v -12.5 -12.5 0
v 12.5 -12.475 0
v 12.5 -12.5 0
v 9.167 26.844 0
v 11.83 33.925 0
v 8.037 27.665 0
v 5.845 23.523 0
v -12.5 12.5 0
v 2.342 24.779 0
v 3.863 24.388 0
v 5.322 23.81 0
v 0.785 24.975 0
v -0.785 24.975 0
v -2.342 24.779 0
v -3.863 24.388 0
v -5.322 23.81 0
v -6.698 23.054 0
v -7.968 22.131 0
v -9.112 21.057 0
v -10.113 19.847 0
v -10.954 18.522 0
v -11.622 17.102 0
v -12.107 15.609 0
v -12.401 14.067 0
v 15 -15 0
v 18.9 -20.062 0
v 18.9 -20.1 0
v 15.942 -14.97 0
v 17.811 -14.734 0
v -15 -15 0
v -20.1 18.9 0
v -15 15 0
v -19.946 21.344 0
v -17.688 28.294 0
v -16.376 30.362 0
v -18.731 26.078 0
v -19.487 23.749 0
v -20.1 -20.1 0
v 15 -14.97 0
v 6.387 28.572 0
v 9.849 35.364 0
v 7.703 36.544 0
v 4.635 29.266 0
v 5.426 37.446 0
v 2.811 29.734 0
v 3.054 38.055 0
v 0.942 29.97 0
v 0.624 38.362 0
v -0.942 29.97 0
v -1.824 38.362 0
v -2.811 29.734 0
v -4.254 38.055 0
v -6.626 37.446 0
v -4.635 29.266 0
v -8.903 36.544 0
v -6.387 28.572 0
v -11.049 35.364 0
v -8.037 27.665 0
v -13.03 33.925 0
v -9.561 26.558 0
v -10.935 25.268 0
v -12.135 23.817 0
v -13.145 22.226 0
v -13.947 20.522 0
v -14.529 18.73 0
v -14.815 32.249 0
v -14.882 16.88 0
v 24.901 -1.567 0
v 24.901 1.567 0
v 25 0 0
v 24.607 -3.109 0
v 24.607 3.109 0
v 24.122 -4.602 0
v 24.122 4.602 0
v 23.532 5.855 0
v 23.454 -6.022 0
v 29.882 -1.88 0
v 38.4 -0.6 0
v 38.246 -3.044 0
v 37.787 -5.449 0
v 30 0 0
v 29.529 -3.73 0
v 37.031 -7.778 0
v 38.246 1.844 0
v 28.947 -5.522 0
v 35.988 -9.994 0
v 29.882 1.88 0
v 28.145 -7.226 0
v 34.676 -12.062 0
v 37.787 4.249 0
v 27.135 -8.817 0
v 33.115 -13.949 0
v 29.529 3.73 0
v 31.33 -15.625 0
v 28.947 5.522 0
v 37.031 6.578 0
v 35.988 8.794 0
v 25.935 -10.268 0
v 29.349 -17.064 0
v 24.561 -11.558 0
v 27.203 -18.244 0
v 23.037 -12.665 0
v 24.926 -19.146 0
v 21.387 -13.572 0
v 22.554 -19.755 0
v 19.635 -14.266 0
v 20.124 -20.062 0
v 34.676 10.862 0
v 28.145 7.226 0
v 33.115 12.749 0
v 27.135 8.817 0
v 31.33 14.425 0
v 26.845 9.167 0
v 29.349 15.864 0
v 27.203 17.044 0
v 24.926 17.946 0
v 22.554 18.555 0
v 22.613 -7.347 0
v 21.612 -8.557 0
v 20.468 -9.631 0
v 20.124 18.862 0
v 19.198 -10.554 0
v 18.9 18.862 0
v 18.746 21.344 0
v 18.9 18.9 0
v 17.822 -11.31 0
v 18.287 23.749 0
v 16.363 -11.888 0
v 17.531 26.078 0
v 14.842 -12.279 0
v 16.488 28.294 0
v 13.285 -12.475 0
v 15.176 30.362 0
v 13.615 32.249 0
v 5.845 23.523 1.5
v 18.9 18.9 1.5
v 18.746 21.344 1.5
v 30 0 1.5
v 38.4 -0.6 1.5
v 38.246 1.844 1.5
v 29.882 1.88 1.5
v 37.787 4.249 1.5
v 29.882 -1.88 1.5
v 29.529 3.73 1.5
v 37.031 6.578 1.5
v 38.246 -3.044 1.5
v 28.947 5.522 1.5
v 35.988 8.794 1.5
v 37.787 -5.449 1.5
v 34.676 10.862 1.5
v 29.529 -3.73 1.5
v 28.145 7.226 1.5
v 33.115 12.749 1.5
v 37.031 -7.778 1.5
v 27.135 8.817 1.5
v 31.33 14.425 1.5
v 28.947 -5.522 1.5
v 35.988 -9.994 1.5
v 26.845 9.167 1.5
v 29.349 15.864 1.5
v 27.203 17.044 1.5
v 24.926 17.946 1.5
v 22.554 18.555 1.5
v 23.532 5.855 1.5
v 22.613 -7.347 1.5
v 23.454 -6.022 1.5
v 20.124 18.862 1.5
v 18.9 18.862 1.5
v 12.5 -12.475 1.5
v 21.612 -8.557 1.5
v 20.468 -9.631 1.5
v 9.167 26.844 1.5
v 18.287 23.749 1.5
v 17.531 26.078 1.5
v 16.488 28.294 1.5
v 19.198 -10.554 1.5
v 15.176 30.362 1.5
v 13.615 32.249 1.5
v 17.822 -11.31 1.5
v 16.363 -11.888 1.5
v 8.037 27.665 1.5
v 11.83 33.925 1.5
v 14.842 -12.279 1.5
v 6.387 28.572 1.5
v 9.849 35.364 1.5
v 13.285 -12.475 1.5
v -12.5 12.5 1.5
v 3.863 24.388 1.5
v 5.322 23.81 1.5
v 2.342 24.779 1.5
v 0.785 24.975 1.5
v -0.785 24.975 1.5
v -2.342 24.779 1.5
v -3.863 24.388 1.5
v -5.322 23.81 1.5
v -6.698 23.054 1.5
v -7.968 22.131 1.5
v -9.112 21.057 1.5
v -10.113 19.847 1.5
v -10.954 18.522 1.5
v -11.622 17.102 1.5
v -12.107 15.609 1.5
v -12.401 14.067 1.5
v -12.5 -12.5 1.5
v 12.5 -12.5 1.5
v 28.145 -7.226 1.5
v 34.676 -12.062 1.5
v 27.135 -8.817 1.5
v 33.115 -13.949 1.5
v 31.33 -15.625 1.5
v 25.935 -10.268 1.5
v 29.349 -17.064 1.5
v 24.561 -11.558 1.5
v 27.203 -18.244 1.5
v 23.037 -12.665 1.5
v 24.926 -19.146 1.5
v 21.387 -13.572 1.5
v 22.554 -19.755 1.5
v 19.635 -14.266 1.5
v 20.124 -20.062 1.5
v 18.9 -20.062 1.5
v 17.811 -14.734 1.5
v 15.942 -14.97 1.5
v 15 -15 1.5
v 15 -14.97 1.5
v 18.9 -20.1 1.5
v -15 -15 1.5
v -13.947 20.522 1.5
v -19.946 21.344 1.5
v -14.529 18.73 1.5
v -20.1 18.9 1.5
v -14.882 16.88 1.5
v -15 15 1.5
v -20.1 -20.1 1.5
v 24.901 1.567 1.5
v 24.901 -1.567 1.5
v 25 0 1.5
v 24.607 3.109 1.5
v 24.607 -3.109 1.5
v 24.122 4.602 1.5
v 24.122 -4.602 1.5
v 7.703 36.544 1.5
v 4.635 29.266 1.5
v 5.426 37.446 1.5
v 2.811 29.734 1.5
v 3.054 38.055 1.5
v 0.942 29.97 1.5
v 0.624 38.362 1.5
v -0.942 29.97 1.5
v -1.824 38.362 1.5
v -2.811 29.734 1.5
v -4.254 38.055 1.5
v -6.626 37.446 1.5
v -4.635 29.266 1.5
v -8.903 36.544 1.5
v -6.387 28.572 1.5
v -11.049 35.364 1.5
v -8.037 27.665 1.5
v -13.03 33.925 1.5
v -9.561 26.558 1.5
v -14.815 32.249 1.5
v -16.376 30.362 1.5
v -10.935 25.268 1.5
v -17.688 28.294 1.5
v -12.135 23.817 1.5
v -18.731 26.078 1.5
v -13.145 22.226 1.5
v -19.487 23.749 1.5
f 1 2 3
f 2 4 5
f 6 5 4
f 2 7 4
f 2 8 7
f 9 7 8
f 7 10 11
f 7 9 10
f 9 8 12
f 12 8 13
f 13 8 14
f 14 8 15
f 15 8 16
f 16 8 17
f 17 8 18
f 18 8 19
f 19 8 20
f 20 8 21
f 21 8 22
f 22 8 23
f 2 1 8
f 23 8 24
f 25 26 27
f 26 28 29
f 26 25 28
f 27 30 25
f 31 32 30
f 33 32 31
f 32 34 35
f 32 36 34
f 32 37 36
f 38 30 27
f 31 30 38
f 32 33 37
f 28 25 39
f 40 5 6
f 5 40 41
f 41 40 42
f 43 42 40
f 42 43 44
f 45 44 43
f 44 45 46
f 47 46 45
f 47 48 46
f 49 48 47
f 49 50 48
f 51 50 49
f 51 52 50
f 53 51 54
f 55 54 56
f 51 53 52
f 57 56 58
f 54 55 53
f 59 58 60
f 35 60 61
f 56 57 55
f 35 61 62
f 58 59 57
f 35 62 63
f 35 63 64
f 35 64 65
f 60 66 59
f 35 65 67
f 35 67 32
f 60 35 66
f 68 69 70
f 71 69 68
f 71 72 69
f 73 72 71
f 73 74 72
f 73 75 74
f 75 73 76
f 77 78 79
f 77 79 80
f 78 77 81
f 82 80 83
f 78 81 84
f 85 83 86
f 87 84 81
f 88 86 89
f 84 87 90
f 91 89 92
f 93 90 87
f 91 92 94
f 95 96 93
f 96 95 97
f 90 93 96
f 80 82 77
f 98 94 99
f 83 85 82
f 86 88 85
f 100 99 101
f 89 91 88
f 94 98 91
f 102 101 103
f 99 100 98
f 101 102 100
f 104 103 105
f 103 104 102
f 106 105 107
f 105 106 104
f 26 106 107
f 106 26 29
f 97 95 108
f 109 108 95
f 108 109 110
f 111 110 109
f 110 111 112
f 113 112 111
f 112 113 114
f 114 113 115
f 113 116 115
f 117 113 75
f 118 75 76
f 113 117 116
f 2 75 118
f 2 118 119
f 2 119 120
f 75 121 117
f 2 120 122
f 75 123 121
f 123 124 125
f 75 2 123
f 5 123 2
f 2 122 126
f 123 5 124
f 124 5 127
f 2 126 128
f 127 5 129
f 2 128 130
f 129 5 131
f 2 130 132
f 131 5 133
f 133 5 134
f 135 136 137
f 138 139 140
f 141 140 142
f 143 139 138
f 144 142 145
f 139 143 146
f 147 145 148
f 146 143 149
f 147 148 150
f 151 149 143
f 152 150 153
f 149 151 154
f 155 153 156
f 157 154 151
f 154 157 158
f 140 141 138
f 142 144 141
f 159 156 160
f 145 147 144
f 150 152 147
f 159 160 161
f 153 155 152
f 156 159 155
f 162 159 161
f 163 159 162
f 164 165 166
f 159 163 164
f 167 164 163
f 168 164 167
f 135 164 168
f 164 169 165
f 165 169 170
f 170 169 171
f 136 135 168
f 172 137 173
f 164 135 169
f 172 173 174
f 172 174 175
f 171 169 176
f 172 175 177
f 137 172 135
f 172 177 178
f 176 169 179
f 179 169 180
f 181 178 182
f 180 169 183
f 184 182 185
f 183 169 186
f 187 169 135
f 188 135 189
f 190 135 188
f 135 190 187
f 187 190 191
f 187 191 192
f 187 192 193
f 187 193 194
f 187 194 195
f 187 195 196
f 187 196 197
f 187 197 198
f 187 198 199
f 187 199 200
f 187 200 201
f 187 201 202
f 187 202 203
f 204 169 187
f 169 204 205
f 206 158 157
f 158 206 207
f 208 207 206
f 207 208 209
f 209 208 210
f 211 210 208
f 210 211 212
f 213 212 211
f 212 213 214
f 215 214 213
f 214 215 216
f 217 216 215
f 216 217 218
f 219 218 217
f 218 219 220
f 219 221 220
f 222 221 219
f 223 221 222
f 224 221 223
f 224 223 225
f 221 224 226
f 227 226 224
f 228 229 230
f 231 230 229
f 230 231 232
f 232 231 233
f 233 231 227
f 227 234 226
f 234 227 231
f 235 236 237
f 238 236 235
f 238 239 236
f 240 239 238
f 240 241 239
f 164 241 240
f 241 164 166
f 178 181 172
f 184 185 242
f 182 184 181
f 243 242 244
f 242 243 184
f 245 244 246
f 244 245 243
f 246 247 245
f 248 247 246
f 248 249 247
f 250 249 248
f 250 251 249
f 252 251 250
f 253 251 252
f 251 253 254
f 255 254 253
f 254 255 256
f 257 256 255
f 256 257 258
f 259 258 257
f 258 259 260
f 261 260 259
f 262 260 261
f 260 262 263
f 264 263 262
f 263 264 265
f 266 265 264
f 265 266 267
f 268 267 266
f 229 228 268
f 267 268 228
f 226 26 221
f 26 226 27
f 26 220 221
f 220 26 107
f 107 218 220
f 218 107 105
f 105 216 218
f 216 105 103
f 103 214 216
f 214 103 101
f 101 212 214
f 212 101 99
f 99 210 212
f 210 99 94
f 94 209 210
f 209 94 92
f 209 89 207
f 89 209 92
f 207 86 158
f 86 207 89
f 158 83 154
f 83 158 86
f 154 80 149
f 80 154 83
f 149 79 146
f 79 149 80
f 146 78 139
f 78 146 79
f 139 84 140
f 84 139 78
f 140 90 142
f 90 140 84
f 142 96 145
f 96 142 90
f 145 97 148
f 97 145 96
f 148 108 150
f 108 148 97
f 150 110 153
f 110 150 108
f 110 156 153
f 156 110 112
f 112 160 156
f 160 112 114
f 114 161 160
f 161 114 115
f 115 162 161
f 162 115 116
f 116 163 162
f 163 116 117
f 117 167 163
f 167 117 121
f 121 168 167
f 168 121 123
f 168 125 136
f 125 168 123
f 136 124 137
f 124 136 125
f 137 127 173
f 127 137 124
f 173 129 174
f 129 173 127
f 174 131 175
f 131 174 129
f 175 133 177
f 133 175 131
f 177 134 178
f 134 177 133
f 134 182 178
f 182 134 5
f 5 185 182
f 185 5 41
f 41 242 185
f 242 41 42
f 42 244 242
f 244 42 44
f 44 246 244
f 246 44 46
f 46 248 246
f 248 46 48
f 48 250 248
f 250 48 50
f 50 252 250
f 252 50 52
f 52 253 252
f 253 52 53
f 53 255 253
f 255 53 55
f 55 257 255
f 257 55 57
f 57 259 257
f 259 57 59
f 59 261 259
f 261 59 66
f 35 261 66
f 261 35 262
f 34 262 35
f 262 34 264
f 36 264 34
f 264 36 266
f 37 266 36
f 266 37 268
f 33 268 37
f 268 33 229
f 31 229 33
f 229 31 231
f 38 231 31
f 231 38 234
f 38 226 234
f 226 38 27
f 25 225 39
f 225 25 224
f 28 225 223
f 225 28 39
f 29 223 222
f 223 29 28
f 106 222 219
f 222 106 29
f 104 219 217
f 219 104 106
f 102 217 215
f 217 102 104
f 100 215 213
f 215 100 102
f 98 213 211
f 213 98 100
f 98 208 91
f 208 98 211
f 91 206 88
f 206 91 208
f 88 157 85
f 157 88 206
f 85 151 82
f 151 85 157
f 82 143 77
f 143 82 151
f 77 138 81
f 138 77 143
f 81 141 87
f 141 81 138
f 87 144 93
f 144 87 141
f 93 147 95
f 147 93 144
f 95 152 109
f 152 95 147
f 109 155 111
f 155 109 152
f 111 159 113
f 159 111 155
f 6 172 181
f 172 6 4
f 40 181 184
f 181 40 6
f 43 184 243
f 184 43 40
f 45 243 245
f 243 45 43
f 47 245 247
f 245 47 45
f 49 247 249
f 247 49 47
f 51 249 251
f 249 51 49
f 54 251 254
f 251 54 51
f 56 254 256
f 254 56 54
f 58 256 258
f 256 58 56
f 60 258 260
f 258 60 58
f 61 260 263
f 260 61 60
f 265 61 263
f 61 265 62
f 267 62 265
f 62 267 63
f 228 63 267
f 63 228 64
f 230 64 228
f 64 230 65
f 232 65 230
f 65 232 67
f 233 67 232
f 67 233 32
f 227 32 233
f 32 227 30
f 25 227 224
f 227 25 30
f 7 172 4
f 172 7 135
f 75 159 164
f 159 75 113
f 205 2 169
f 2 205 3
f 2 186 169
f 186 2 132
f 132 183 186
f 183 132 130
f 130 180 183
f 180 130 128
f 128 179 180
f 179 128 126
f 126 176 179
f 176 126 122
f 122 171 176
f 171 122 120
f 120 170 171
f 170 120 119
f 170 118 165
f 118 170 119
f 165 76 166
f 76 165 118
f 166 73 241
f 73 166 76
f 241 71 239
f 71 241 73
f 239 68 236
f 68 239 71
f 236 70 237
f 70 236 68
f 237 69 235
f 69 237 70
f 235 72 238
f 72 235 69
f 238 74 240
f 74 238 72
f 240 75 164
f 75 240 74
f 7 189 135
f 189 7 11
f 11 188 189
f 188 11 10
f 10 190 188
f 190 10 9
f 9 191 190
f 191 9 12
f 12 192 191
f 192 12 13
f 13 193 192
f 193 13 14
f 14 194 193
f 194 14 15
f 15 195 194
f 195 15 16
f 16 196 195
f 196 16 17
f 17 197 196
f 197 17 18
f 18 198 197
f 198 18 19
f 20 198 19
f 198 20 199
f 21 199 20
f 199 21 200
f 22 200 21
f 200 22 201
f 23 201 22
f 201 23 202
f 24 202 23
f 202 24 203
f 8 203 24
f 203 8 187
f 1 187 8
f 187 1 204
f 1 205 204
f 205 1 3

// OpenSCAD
// paperclip (c)g3org 2014 

//in mm
inner_heart_size=25; 
//thickness
height=1.5; 

$fn=50*1;

module inner_heart() {
	linear_extrude(height = height)
		{
			square(inner_heart_size,center=true);
			translate([0, inner_heart_size/2, 0])
			circle(inner_heart_size/2);
			translate([inner_heart_size/2, 0, 0])
			circle(inner_heart_size/2);
		}
	
}

module outer_heart(){
	scale([1.2,1.2]){
			difference(){
				translate([-0.5,-0.5,0]) scale([1.3,1.3]) inner_heart();
				inner_heart();
			}
	}
}

module bridge(){
	translate([inner_heart_size/2*1.1,inner_heart_size/2*1.1,0]) {
		rotate([0,0,45]) {
			linear_extrude(height = height) square([inner_heart_size/2,inner_heart_size],center=true);
		}
	}
}

bridge();
inner_heart();
outer_heart();




